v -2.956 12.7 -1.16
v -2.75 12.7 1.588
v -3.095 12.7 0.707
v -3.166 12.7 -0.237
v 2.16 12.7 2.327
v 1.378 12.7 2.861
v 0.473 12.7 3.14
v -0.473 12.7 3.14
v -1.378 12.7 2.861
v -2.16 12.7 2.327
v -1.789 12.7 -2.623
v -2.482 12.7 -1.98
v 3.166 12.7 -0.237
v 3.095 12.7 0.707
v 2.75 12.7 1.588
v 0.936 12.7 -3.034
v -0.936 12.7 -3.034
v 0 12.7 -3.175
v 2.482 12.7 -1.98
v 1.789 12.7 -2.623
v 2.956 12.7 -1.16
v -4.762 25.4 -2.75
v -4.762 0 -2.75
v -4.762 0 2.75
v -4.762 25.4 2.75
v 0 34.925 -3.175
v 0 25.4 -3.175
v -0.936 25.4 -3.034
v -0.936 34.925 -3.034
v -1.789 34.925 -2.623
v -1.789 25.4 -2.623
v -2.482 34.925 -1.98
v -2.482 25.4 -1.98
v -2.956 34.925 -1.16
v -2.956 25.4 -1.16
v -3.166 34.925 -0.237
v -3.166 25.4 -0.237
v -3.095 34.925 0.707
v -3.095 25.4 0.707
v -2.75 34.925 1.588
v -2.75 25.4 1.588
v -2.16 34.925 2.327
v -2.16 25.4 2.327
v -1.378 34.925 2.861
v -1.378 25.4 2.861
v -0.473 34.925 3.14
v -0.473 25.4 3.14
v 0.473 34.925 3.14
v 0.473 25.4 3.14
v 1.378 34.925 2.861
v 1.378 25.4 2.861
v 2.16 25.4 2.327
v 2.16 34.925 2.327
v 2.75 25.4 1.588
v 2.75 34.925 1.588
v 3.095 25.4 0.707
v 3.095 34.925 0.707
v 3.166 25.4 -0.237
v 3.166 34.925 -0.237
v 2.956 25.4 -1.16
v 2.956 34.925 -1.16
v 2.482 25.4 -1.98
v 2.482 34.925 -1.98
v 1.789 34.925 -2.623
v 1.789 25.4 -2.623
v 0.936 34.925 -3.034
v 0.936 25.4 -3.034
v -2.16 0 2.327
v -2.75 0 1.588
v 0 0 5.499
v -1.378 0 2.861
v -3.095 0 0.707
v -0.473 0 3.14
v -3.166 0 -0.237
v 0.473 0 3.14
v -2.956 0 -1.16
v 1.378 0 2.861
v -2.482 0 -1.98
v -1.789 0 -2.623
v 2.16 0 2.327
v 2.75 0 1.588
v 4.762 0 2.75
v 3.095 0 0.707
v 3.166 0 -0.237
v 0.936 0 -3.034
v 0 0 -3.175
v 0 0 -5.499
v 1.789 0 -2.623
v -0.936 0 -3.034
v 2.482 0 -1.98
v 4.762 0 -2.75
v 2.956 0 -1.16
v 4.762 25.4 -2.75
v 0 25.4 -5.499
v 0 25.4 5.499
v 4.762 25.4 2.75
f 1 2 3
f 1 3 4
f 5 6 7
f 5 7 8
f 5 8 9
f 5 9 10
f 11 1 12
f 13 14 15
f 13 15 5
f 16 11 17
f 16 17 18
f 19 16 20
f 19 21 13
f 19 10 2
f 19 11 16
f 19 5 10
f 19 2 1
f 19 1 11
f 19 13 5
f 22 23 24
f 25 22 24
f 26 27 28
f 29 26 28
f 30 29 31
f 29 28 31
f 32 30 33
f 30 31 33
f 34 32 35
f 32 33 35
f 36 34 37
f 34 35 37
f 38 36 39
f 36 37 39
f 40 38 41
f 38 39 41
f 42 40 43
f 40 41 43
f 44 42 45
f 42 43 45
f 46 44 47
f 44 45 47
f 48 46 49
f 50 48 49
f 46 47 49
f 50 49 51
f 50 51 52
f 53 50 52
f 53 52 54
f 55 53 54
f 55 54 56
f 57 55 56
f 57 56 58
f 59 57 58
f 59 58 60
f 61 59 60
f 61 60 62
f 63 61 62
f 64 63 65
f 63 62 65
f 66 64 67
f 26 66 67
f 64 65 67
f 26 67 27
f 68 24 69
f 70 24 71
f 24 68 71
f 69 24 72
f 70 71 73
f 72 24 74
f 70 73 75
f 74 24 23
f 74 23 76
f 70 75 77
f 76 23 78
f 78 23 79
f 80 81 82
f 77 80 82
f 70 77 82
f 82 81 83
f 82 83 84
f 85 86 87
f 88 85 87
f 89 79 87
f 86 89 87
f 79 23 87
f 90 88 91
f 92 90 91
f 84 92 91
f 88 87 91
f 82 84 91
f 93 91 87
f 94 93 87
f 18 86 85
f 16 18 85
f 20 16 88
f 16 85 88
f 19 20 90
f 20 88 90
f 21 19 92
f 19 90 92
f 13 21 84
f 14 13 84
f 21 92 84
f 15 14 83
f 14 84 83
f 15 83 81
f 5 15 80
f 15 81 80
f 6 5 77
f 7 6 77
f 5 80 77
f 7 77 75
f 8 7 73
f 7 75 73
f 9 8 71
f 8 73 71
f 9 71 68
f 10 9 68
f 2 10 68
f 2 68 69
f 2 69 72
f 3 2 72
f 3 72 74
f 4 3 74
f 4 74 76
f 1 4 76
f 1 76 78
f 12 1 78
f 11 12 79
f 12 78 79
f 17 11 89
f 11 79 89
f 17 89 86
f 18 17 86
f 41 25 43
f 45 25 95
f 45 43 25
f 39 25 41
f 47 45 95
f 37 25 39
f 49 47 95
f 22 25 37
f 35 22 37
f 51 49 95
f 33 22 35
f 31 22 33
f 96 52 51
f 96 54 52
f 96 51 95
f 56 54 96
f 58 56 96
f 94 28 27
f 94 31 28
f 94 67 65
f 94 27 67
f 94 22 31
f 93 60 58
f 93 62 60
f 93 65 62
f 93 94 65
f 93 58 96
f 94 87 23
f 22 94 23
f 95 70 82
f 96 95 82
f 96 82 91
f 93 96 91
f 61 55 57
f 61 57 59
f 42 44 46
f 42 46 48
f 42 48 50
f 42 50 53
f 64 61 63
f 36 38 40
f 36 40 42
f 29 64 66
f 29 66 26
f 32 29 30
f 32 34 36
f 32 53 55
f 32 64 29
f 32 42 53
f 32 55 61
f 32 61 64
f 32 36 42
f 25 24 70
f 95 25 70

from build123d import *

# Parameters (mm, degrees)
BOSS_EXTRUDE1_DEPTH = 25.4
SKETCH2_R           = 3.175
CUT_EXTRUDE1_DEPTH  = 12.7
SKETCH3_R           = 3.175
BOSS_EXTRUDE2_DEPTH = 9.525


with BuildPart() as part:
    # Sketch1 → Boss-Extrude1 (new body)
    with BuildSketch(Plane(origin=(0, 0, 0), x_dir=(1, 0, 0), z_dir=(0, 1, 0))):
        Polygon((0, 5.499261314), (-4.7625, 2.749630657), (-4.7625, -2.749630657), (0, -5.499261314), (4.7625, -2.749630657), (4.7625, 2.749630657), align=None)
    extrude(amount=BOSS_EXTRUDE1_DEPTH)

    # Sketch2 → Cut-Extrude1 (cut)
    with BuildSketch(Plane.XZ):
        with Locations(Location((0, 0, 0), (0, 0, 270))):
            Circle(SKETCH2_R)
    extrude(amount=-CUT_EXTRUDE1_DEPTH, mode=Mode.SUBTRACT)

    # Sketch3 → Boss-Extrude2 (add)
    with BuildSketch(Plane(origin=(0, 25.4, 0), x_dir=(1, 0, 0), z_dir=(0, 1, 0))):
        with Locations(Location((0, 0, 0), (0, 0, 90))):
            Circle(SKETCH3_R)
    extrude(amount=BOSS_EXTRUDE2_DEPTH)


solid = part.part
